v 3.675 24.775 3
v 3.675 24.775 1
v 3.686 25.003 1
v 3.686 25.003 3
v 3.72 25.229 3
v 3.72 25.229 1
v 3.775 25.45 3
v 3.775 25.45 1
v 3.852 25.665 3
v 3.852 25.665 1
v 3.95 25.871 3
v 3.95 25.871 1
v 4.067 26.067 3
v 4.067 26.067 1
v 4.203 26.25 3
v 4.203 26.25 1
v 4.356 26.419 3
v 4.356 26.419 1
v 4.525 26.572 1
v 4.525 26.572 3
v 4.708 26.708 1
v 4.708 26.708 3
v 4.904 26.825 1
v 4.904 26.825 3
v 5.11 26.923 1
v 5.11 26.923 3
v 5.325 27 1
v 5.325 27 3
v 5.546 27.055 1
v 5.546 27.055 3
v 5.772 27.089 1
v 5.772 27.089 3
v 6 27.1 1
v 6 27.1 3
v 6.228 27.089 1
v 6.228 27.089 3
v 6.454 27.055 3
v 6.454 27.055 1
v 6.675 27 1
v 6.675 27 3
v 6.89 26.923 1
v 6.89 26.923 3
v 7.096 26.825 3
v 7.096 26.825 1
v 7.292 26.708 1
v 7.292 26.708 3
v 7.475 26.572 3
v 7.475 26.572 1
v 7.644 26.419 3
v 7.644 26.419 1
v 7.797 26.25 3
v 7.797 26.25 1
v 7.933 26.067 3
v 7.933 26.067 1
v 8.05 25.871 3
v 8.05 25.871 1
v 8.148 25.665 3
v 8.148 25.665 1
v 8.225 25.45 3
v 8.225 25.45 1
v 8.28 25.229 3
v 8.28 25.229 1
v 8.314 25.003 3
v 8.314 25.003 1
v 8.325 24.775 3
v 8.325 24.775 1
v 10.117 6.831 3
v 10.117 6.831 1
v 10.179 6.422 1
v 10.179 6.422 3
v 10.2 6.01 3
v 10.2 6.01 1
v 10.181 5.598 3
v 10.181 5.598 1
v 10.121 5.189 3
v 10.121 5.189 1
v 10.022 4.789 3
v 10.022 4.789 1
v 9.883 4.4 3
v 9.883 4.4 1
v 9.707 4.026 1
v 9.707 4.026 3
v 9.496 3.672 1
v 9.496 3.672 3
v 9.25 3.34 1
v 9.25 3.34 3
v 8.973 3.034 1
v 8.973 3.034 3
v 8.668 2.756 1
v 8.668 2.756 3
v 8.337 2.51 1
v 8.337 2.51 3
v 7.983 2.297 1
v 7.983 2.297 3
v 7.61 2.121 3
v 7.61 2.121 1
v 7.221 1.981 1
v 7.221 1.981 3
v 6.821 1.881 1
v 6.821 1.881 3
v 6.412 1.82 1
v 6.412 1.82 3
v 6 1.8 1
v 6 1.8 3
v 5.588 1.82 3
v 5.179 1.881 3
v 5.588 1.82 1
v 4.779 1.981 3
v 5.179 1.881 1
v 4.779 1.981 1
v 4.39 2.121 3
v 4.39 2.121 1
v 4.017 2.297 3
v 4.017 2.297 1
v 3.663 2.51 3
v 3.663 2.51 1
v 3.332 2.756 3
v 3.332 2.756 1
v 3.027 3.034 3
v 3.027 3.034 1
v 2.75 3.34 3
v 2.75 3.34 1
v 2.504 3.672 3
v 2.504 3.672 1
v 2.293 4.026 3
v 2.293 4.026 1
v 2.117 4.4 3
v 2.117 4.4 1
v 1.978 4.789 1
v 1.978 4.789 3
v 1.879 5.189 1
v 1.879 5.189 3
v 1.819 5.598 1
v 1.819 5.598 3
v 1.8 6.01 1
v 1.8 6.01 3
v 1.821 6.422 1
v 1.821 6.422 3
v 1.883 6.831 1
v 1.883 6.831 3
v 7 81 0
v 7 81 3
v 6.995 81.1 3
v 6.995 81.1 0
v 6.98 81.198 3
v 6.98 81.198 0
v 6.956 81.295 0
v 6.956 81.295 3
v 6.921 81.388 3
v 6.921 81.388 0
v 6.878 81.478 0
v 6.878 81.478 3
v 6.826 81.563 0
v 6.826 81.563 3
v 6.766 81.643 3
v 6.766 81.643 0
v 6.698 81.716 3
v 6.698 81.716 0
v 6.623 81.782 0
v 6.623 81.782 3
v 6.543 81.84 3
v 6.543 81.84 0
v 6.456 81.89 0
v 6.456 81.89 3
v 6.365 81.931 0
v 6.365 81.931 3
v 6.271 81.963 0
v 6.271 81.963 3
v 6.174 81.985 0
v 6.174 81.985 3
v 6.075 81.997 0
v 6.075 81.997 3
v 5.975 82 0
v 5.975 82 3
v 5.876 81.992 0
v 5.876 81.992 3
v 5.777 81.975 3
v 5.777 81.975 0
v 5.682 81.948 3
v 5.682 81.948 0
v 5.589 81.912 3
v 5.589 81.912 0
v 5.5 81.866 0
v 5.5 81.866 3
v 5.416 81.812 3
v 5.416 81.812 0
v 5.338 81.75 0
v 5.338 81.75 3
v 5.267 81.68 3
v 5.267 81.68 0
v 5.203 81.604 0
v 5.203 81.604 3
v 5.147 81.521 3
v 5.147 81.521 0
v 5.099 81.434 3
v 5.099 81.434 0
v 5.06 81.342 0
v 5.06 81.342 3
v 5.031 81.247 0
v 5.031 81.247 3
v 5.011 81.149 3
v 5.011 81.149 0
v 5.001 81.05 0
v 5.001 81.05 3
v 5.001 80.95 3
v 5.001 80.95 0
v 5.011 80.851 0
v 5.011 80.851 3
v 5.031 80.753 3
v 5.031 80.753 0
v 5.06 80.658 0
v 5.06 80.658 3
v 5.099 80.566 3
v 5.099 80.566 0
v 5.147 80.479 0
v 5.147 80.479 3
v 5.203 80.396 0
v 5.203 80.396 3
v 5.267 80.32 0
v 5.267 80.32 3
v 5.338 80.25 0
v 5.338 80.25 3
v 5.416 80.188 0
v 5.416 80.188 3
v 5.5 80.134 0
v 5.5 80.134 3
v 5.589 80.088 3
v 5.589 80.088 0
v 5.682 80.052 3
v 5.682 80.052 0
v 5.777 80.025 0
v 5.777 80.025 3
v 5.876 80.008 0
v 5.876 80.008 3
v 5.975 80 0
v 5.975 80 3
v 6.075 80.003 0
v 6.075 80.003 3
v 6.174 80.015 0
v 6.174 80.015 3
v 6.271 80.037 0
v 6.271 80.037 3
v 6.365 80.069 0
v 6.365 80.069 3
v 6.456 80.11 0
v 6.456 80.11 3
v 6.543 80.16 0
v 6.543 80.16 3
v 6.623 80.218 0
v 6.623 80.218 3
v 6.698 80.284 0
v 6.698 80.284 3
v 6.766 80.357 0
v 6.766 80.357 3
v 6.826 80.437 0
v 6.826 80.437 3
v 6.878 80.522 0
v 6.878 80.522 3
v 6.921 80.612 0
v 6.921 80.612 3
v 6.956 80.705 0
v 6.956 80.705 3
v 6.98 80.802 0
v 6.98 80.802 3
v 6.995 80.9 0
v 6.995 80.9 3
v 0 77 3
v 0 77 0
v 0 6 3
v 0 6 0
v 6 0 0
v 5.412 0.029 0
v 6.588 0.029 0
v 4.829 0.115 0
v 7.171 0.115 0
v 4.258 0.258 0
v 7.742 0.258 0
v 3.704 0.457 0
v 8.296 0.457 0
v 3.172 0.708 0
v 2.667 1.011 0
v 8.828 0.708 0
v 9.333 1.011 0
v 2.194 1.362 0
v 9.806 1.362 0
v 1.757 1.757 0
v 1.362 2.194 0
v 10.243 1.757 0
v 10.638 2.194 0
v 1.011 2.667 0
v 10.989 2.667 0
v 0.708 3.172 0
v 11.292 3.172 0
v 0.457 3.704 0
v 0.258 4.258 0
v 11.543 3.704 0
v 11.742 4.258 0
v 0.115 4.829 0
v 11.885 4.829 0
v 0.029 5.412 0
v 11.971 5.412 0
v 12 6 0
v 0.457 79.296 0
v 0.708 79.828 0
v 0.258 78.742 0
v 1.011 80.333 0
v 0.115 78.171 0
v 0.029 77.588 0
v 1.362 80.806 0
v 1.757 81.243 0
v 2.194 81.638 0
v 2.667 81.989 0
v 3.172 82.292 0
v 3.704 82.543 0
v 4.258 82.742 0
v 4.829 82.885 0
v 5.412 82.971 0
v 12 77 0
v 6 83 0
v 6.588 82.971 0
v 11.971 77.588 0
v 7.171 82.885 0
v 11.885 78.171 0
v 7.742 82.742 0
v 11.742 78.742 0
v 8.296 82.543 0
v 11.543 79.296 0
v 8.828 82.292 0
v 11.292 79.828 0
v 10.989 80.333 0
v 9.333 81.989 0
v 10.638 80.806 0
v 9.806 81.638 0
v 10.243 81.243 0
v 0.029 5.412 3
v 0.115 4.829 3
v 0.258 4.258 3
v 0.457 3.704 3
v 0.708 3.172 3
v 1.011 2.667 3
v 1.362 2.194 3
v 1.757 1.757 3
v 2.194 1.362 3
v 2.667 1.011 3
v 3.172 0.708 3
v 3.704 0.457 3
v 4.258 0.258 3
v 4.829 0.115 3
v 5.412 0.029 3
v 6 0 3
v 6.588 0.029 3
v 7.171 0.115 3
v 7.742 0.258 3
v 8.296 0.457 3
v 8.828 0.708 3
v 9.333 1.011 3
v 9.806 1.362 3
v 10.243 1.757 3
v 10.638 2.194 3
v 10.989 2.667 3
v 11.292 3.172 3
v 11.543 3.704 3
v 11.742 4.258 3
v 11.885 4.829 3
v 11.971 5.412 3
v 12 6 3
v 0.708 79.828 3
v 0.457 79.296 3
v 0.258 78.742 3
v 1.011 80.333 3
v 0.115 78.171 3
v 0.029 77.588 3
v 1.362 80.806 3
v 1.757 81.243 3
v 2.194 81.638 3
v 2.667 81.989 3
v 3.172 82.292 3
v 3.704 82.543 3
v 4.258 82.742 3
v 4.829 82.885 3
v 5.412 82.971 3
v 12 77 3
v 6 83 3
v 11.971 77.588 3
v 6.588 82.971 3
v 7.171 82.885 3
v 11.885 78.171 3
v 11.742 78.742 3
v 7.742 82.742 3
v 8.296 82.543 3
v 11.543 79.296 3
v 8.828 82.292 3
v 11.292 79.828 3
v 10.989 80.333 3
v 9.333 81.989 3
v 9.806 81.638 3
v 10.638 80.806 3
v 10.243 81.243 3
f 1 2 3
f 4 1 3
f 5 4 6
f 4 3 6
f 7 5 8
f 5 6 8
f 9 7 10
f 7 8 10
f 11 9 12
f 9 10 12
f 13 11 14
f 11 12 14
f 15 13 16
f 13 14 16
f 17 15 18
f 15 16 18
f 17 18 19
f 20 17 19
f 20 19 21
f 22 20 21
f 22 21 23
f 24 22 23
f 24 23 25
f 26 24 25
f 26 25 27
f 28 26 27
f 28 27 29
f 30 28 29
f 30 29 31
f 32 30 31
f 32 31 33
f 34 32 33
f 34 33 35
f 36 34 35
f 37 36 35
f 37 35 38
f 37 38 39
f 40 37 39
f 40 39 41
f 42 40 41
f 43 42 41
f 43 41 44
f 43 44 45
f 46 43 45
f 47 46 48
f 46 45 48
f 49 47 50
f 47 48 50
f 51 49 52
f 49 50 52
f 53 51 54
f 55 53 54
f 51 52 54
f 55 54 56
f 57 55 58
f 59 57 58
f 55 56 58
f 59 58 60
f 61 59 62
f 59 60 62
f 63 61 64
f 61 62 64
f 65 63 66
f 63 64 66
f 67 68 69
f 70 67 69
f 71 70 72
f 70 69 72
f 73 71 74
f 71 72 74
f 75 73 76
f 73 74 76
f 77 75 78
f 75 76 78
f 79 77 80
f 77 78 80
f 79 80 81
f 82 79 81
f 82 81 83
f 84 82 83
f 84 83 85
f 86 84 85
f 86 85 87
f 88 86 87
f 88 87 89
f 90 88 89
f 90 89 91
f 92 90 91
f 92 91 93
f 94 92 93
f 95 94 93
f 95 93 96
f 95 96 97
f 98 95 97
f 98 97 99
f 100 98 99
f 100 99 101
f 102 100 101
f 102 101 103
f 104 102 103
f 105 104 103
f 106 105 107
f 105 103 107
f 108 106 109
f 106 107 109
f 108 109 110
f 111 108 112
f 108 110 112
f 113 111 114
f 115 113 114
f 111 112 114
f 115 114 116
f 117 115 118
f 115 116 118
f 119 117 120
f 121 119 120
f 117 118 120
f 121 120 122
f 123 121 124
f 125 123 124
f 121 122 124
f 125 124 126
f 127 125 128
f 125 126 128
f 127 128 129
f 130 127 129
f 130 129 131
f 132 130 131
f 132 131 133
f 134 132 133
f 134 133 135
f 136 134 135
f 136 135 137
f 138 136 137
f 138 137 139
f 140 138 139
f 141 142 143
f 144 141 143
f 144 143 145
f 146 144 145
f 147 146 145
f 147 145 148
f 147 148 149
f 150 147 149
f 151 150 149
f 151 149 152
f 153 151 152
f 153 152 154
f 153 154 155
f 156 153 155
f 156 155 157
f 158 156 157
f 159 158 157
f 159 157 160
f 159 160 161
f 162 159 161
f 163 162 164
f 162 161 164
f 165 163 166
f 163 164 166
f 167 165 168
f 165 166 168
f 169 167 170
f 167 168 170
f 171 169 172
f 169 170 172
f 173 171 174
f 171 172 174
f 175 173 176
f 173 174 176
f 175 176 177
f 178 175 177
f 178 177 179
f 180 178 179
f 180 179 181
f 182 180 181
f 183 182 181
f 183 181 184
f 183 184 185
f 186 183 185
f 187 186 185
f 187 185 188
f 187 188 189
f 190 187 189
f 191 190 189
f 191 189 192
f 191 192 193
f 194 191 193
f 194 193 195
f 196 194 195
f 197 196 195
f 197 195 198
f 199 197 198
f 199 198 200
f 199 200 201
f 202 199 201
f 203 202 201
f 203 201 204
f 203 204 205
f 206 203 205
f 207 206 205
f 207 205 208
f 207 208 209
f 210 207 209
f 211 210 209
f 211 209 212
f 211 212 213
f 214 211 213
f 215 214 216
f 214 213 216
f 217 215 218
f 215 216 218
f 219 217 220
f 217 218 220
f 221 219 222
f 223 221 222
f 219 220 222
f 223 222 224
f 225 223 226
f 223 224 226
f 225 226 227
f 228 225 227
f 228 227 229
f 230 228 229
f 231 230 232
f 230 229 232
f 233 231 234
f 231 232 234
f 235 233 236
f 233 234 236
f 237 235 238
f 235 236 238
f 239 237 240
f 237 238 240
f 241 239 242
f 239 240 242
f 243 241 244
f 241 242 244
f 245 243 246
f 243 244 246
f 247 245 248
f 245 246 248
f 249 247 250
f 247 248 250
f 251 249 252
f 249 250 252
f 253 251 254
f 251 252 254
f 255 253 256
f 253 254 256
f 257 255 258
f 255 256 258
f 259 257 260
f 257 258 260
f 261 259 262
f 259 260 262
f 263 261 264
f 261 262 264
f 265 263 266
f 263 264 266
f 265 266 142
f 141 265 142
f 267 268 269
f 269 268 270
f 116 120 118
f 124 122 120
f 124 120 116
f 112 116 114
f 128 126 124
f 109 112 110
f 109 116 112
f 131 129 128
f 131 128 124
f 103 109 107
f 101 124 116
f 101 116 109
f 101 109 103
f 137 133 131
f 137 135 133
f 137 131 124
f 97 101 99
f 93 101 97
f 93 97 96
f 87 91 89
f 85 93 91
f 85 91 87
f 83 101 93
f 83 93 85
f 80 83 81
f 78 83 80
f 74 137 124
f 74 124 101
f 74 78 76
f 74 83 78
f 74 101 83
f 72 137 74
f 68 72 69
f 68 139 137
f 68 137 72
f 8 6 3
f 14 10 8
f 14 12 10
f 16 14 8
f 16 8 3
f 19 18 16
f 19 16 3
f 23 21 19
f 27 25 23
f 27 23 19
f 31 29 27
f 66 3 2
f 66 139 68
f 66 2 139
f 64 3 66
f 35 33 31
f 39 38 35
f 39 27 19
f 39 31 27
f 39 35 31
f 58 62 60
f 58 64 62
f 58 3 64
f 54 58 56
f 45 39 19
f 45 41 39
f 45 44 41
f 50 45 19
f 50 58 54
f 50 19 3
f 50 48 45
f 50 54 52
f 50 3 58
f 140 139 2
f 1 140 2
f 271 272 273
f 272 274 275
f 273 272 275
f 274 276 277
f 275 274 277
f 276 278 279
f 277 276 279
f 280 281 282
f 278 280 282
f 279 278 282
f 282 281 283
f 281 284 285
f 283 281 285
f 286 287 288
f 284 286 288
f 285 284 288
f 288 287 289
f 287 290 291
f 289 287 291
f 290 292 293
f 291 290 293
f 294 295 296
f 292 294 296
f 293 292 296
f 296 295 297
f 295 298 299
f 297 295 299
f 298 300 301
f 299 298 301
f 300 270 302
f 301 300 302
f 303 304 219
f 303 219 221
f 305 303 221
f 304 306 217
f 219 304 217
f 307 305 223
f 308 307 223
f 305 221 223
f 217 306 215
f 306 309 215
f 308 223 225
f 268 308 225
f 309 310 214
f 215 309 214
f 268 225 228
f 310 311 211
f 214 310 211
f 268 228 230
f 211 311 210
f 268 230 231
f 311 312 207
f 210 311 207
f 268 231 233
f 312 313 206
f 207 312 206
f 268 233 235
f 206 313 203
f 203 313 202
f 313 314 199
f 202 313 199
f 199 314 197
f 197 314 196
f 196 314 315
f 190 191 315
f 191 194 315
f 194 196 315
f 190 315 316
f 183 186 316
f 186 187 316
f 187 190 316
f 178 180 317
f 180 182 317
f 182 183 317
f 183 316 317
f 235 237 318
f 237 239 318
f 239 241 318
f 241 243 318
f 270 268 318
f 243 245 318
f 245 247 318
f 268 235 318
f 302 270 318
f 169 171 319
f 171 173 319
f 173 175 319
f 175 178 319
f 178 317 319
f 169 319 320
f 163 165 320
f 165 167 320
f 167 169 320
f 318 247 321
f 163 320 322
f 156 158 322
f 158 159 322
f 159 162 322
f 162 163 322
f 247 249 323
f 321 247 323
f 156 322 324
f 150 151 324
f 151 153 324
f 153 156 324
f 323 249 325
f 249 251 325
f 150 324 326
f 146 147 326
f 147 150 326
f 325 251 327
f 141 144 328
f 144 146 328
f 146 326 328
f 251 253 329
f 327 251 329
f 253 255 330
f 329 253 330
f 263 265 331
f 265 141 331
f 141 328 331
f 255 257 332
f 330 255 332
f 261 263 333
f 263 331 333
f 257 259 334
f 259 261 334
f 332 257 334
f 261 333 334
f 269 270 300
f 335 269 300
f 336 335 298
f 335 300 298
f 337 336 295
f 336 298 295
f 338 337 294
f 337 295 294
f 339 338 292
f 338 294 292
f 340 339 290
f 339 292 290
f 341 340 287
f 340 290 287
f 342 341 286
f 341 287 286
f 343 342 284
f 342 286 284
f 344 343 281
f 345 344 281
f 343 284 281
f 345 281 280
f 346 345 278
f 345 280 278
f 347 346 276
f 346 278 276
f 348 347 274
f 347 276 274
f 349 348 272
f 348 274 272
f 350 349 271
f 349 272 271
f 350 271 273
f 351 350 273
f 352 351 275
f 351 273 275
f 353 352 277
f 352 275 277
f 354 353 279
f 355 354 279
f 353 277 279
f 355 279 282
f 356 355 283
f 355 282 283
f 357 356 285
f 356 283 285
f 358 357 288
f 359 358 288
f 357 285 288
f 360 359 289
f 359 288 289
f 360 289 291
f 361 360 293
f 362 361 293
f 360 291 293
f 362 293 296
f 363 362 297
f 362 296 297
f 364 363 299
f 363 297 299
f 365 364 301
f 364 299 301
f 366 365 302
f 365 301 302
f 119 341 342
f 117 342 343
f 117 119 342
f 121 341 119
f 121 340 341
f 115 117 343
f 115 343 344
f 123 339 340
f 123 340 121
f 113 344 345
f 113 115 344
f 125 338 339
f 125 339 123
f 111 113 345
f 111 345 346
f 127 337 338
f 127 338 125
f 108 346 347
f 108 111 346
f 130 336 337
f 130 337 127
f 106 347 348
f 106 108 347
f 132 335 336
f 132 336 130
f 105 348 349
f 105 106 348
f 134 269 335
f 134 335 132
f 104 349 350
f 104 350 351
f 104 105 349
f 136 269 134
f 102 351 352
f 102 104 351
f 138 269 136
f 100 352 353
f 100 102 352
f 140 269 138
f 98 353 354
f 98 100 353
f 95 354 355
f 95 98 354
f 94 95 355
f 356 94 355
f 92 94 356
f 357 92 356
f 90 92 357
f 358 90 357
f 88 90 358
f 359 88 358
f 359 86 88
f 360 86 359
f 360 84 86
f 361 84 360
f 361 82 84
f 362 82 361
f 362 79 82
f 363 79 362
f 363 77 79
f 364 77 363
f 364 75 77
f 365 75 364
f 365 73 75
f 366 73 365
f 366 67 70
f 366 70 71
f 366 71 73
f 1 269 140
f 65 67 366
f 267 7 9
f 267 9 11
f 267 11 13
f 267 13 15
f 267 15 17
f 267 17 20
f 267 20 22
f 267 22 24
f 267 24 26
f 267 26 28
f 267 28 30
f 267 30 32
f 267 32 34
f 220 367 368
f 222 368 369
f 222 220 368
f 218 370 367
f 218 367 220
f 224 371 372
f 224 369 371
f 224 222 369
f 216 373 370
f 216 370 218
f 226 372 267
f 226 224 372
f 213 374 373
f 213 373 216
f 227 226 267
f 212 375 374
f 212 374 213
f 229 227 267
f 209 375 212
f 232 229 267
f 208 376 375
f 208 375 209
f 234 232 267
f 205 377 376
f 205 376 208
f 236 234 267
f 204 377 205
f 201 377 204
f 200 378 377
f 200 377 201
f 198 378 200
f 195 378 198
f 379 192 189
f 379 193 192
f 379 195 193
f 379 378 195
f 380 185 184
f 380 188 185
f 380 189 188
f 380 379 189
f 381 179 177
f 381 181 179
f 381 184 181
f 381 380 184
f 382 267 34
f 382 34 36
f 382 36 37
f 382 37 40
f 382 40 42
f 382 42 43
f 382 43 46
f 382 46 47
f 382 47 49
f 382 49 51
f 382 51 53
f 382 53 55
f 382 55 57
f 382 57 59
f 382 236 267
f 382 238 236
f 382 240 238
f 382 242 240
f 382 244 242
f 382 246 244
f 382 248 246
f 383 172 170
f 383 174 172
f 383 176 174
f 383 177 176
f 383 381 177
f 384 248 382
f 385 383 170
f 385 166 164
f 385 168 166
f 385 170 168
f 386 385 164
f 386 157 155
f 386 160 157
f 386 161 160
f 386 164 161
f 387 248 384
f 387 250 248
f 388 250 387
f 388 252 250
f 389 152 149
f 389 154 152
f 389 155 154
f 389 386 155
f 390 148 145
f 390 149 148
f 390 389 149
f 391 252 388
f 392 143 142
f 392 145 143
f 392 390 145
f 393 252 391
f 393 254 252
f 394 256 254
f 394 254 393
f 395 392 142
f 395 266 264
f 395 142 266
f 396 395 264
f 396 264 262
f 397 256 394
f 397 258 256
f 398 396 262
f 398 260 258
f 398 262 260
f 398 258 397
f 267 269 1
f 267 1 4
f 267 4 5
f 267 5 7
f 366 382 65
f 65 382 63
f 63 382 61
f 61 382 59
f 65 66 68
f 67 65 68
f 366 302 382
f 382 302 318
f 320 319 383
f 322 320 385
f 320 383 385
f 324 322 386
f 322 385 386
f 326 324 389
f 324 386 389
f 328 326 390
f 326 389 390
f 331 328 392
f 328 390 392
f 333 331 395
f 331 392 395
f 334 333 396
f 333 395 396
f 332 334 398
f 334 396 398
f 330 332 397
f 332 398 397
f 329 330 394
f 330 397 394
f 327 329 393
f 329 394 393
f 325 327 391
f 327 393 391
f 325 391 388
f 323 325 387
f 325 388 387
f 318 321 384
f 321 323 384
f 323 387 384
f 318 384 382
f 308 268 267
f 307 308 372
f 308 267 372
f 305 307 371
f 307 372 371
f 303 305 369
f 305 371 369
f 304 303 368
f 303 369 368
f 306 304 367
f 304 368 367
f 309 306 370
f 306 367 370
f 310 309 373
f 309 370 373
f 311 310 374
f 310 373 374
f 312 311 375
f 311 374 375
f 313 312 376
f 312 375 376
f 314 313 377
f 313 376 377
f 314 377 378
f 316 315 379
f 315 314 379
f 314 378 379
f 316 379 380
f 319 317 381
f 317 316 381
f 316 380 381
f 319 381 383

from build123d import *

# Parameters (mm, degrees)
BOSS_EXTRUDE1_DEPTH = 3
BOSS_EXTRUDE2_DEPTH = 1
SKETCH2_R           = 1
CUT_EXTRUDE1_DEPTH  = 84.91662529


with BuildPart() as part:
    # Sketch1 → Boss-Extrude1 (new body)
    with BuildSketch(Plane.XY):
        with BuildLine():
            Line((0, 83), (0, 6))
            ThreePointArc((0, 6), (1.757359313, 1.757359313), (6, 0))
            ThreePointArc((6, 0), (10.242640687, 1.757359313), (12, 6))
            Line((12, 6), (12, 83))
            Line((12, 83), (0, 83))
        make_face()
        with BuildLine():
            Line((1.882949163, 6.83059762), (3.675, 24.775))
            ThreePointArc((3.675, 24.775), (6, 27.1), (8.325, 24.775))
            Line((8.325, 24.775), (10.117050837, 6.83059762))
            ThreePointArc((10.117050837, 6.83059762), (6, 1.8), (1.882949163, 6.83059762))
        make_face(mode=Mode.SUBTRACT)
    extrude(amount=BOSS_EXTRUDE1_DEPTH)

    # Sketch1<3> → Boss-Extrude2 (add)
    with BuildSketch(Plane.XY):
        with BuildLine():
            ThreePointArc((8.325, 24.775), (6, 27.1), (3.675, 24.775))
            Line((3.675, 24.775), (1.882949163, 6.83059762))
            ThreePointArc((1.882949163, 6.83059762), (6, 1.8), (10.117050837, 6.83059762))
            Line((10.117050837, 6.83059762), (8.325, 24.775))
        make_face()
    extrude(amount=BOSS_EXTRUDE2_DEPTH)

    # Sketch2 → Cut-Extrude1 (cut, through all)
    with BuildSketch(Plane.XY.offset(3)):
        with BuildLine():
            Line((12, 83), (6, 83))
            ThreePointArc((6, 83), (10.242640687, 81.242640687), (12, 77))
            Line((12, 77), (12, 83))
        make_face()
        with BuildLine():
            Line((0, 83), (0, 77))
            ThreePointArc((0, 77), (1.757359313, 81.242640687), (6, 83))
            Line((6, 83), (0, 83))
        make_face()
        with Locations((6, 81)):
            Circle(SKETCH2_R)
    extrude(amount=-CUT_EXTRUDE1_DEPTH, mode=Mode.SUBTRACT)


solid = part.part
